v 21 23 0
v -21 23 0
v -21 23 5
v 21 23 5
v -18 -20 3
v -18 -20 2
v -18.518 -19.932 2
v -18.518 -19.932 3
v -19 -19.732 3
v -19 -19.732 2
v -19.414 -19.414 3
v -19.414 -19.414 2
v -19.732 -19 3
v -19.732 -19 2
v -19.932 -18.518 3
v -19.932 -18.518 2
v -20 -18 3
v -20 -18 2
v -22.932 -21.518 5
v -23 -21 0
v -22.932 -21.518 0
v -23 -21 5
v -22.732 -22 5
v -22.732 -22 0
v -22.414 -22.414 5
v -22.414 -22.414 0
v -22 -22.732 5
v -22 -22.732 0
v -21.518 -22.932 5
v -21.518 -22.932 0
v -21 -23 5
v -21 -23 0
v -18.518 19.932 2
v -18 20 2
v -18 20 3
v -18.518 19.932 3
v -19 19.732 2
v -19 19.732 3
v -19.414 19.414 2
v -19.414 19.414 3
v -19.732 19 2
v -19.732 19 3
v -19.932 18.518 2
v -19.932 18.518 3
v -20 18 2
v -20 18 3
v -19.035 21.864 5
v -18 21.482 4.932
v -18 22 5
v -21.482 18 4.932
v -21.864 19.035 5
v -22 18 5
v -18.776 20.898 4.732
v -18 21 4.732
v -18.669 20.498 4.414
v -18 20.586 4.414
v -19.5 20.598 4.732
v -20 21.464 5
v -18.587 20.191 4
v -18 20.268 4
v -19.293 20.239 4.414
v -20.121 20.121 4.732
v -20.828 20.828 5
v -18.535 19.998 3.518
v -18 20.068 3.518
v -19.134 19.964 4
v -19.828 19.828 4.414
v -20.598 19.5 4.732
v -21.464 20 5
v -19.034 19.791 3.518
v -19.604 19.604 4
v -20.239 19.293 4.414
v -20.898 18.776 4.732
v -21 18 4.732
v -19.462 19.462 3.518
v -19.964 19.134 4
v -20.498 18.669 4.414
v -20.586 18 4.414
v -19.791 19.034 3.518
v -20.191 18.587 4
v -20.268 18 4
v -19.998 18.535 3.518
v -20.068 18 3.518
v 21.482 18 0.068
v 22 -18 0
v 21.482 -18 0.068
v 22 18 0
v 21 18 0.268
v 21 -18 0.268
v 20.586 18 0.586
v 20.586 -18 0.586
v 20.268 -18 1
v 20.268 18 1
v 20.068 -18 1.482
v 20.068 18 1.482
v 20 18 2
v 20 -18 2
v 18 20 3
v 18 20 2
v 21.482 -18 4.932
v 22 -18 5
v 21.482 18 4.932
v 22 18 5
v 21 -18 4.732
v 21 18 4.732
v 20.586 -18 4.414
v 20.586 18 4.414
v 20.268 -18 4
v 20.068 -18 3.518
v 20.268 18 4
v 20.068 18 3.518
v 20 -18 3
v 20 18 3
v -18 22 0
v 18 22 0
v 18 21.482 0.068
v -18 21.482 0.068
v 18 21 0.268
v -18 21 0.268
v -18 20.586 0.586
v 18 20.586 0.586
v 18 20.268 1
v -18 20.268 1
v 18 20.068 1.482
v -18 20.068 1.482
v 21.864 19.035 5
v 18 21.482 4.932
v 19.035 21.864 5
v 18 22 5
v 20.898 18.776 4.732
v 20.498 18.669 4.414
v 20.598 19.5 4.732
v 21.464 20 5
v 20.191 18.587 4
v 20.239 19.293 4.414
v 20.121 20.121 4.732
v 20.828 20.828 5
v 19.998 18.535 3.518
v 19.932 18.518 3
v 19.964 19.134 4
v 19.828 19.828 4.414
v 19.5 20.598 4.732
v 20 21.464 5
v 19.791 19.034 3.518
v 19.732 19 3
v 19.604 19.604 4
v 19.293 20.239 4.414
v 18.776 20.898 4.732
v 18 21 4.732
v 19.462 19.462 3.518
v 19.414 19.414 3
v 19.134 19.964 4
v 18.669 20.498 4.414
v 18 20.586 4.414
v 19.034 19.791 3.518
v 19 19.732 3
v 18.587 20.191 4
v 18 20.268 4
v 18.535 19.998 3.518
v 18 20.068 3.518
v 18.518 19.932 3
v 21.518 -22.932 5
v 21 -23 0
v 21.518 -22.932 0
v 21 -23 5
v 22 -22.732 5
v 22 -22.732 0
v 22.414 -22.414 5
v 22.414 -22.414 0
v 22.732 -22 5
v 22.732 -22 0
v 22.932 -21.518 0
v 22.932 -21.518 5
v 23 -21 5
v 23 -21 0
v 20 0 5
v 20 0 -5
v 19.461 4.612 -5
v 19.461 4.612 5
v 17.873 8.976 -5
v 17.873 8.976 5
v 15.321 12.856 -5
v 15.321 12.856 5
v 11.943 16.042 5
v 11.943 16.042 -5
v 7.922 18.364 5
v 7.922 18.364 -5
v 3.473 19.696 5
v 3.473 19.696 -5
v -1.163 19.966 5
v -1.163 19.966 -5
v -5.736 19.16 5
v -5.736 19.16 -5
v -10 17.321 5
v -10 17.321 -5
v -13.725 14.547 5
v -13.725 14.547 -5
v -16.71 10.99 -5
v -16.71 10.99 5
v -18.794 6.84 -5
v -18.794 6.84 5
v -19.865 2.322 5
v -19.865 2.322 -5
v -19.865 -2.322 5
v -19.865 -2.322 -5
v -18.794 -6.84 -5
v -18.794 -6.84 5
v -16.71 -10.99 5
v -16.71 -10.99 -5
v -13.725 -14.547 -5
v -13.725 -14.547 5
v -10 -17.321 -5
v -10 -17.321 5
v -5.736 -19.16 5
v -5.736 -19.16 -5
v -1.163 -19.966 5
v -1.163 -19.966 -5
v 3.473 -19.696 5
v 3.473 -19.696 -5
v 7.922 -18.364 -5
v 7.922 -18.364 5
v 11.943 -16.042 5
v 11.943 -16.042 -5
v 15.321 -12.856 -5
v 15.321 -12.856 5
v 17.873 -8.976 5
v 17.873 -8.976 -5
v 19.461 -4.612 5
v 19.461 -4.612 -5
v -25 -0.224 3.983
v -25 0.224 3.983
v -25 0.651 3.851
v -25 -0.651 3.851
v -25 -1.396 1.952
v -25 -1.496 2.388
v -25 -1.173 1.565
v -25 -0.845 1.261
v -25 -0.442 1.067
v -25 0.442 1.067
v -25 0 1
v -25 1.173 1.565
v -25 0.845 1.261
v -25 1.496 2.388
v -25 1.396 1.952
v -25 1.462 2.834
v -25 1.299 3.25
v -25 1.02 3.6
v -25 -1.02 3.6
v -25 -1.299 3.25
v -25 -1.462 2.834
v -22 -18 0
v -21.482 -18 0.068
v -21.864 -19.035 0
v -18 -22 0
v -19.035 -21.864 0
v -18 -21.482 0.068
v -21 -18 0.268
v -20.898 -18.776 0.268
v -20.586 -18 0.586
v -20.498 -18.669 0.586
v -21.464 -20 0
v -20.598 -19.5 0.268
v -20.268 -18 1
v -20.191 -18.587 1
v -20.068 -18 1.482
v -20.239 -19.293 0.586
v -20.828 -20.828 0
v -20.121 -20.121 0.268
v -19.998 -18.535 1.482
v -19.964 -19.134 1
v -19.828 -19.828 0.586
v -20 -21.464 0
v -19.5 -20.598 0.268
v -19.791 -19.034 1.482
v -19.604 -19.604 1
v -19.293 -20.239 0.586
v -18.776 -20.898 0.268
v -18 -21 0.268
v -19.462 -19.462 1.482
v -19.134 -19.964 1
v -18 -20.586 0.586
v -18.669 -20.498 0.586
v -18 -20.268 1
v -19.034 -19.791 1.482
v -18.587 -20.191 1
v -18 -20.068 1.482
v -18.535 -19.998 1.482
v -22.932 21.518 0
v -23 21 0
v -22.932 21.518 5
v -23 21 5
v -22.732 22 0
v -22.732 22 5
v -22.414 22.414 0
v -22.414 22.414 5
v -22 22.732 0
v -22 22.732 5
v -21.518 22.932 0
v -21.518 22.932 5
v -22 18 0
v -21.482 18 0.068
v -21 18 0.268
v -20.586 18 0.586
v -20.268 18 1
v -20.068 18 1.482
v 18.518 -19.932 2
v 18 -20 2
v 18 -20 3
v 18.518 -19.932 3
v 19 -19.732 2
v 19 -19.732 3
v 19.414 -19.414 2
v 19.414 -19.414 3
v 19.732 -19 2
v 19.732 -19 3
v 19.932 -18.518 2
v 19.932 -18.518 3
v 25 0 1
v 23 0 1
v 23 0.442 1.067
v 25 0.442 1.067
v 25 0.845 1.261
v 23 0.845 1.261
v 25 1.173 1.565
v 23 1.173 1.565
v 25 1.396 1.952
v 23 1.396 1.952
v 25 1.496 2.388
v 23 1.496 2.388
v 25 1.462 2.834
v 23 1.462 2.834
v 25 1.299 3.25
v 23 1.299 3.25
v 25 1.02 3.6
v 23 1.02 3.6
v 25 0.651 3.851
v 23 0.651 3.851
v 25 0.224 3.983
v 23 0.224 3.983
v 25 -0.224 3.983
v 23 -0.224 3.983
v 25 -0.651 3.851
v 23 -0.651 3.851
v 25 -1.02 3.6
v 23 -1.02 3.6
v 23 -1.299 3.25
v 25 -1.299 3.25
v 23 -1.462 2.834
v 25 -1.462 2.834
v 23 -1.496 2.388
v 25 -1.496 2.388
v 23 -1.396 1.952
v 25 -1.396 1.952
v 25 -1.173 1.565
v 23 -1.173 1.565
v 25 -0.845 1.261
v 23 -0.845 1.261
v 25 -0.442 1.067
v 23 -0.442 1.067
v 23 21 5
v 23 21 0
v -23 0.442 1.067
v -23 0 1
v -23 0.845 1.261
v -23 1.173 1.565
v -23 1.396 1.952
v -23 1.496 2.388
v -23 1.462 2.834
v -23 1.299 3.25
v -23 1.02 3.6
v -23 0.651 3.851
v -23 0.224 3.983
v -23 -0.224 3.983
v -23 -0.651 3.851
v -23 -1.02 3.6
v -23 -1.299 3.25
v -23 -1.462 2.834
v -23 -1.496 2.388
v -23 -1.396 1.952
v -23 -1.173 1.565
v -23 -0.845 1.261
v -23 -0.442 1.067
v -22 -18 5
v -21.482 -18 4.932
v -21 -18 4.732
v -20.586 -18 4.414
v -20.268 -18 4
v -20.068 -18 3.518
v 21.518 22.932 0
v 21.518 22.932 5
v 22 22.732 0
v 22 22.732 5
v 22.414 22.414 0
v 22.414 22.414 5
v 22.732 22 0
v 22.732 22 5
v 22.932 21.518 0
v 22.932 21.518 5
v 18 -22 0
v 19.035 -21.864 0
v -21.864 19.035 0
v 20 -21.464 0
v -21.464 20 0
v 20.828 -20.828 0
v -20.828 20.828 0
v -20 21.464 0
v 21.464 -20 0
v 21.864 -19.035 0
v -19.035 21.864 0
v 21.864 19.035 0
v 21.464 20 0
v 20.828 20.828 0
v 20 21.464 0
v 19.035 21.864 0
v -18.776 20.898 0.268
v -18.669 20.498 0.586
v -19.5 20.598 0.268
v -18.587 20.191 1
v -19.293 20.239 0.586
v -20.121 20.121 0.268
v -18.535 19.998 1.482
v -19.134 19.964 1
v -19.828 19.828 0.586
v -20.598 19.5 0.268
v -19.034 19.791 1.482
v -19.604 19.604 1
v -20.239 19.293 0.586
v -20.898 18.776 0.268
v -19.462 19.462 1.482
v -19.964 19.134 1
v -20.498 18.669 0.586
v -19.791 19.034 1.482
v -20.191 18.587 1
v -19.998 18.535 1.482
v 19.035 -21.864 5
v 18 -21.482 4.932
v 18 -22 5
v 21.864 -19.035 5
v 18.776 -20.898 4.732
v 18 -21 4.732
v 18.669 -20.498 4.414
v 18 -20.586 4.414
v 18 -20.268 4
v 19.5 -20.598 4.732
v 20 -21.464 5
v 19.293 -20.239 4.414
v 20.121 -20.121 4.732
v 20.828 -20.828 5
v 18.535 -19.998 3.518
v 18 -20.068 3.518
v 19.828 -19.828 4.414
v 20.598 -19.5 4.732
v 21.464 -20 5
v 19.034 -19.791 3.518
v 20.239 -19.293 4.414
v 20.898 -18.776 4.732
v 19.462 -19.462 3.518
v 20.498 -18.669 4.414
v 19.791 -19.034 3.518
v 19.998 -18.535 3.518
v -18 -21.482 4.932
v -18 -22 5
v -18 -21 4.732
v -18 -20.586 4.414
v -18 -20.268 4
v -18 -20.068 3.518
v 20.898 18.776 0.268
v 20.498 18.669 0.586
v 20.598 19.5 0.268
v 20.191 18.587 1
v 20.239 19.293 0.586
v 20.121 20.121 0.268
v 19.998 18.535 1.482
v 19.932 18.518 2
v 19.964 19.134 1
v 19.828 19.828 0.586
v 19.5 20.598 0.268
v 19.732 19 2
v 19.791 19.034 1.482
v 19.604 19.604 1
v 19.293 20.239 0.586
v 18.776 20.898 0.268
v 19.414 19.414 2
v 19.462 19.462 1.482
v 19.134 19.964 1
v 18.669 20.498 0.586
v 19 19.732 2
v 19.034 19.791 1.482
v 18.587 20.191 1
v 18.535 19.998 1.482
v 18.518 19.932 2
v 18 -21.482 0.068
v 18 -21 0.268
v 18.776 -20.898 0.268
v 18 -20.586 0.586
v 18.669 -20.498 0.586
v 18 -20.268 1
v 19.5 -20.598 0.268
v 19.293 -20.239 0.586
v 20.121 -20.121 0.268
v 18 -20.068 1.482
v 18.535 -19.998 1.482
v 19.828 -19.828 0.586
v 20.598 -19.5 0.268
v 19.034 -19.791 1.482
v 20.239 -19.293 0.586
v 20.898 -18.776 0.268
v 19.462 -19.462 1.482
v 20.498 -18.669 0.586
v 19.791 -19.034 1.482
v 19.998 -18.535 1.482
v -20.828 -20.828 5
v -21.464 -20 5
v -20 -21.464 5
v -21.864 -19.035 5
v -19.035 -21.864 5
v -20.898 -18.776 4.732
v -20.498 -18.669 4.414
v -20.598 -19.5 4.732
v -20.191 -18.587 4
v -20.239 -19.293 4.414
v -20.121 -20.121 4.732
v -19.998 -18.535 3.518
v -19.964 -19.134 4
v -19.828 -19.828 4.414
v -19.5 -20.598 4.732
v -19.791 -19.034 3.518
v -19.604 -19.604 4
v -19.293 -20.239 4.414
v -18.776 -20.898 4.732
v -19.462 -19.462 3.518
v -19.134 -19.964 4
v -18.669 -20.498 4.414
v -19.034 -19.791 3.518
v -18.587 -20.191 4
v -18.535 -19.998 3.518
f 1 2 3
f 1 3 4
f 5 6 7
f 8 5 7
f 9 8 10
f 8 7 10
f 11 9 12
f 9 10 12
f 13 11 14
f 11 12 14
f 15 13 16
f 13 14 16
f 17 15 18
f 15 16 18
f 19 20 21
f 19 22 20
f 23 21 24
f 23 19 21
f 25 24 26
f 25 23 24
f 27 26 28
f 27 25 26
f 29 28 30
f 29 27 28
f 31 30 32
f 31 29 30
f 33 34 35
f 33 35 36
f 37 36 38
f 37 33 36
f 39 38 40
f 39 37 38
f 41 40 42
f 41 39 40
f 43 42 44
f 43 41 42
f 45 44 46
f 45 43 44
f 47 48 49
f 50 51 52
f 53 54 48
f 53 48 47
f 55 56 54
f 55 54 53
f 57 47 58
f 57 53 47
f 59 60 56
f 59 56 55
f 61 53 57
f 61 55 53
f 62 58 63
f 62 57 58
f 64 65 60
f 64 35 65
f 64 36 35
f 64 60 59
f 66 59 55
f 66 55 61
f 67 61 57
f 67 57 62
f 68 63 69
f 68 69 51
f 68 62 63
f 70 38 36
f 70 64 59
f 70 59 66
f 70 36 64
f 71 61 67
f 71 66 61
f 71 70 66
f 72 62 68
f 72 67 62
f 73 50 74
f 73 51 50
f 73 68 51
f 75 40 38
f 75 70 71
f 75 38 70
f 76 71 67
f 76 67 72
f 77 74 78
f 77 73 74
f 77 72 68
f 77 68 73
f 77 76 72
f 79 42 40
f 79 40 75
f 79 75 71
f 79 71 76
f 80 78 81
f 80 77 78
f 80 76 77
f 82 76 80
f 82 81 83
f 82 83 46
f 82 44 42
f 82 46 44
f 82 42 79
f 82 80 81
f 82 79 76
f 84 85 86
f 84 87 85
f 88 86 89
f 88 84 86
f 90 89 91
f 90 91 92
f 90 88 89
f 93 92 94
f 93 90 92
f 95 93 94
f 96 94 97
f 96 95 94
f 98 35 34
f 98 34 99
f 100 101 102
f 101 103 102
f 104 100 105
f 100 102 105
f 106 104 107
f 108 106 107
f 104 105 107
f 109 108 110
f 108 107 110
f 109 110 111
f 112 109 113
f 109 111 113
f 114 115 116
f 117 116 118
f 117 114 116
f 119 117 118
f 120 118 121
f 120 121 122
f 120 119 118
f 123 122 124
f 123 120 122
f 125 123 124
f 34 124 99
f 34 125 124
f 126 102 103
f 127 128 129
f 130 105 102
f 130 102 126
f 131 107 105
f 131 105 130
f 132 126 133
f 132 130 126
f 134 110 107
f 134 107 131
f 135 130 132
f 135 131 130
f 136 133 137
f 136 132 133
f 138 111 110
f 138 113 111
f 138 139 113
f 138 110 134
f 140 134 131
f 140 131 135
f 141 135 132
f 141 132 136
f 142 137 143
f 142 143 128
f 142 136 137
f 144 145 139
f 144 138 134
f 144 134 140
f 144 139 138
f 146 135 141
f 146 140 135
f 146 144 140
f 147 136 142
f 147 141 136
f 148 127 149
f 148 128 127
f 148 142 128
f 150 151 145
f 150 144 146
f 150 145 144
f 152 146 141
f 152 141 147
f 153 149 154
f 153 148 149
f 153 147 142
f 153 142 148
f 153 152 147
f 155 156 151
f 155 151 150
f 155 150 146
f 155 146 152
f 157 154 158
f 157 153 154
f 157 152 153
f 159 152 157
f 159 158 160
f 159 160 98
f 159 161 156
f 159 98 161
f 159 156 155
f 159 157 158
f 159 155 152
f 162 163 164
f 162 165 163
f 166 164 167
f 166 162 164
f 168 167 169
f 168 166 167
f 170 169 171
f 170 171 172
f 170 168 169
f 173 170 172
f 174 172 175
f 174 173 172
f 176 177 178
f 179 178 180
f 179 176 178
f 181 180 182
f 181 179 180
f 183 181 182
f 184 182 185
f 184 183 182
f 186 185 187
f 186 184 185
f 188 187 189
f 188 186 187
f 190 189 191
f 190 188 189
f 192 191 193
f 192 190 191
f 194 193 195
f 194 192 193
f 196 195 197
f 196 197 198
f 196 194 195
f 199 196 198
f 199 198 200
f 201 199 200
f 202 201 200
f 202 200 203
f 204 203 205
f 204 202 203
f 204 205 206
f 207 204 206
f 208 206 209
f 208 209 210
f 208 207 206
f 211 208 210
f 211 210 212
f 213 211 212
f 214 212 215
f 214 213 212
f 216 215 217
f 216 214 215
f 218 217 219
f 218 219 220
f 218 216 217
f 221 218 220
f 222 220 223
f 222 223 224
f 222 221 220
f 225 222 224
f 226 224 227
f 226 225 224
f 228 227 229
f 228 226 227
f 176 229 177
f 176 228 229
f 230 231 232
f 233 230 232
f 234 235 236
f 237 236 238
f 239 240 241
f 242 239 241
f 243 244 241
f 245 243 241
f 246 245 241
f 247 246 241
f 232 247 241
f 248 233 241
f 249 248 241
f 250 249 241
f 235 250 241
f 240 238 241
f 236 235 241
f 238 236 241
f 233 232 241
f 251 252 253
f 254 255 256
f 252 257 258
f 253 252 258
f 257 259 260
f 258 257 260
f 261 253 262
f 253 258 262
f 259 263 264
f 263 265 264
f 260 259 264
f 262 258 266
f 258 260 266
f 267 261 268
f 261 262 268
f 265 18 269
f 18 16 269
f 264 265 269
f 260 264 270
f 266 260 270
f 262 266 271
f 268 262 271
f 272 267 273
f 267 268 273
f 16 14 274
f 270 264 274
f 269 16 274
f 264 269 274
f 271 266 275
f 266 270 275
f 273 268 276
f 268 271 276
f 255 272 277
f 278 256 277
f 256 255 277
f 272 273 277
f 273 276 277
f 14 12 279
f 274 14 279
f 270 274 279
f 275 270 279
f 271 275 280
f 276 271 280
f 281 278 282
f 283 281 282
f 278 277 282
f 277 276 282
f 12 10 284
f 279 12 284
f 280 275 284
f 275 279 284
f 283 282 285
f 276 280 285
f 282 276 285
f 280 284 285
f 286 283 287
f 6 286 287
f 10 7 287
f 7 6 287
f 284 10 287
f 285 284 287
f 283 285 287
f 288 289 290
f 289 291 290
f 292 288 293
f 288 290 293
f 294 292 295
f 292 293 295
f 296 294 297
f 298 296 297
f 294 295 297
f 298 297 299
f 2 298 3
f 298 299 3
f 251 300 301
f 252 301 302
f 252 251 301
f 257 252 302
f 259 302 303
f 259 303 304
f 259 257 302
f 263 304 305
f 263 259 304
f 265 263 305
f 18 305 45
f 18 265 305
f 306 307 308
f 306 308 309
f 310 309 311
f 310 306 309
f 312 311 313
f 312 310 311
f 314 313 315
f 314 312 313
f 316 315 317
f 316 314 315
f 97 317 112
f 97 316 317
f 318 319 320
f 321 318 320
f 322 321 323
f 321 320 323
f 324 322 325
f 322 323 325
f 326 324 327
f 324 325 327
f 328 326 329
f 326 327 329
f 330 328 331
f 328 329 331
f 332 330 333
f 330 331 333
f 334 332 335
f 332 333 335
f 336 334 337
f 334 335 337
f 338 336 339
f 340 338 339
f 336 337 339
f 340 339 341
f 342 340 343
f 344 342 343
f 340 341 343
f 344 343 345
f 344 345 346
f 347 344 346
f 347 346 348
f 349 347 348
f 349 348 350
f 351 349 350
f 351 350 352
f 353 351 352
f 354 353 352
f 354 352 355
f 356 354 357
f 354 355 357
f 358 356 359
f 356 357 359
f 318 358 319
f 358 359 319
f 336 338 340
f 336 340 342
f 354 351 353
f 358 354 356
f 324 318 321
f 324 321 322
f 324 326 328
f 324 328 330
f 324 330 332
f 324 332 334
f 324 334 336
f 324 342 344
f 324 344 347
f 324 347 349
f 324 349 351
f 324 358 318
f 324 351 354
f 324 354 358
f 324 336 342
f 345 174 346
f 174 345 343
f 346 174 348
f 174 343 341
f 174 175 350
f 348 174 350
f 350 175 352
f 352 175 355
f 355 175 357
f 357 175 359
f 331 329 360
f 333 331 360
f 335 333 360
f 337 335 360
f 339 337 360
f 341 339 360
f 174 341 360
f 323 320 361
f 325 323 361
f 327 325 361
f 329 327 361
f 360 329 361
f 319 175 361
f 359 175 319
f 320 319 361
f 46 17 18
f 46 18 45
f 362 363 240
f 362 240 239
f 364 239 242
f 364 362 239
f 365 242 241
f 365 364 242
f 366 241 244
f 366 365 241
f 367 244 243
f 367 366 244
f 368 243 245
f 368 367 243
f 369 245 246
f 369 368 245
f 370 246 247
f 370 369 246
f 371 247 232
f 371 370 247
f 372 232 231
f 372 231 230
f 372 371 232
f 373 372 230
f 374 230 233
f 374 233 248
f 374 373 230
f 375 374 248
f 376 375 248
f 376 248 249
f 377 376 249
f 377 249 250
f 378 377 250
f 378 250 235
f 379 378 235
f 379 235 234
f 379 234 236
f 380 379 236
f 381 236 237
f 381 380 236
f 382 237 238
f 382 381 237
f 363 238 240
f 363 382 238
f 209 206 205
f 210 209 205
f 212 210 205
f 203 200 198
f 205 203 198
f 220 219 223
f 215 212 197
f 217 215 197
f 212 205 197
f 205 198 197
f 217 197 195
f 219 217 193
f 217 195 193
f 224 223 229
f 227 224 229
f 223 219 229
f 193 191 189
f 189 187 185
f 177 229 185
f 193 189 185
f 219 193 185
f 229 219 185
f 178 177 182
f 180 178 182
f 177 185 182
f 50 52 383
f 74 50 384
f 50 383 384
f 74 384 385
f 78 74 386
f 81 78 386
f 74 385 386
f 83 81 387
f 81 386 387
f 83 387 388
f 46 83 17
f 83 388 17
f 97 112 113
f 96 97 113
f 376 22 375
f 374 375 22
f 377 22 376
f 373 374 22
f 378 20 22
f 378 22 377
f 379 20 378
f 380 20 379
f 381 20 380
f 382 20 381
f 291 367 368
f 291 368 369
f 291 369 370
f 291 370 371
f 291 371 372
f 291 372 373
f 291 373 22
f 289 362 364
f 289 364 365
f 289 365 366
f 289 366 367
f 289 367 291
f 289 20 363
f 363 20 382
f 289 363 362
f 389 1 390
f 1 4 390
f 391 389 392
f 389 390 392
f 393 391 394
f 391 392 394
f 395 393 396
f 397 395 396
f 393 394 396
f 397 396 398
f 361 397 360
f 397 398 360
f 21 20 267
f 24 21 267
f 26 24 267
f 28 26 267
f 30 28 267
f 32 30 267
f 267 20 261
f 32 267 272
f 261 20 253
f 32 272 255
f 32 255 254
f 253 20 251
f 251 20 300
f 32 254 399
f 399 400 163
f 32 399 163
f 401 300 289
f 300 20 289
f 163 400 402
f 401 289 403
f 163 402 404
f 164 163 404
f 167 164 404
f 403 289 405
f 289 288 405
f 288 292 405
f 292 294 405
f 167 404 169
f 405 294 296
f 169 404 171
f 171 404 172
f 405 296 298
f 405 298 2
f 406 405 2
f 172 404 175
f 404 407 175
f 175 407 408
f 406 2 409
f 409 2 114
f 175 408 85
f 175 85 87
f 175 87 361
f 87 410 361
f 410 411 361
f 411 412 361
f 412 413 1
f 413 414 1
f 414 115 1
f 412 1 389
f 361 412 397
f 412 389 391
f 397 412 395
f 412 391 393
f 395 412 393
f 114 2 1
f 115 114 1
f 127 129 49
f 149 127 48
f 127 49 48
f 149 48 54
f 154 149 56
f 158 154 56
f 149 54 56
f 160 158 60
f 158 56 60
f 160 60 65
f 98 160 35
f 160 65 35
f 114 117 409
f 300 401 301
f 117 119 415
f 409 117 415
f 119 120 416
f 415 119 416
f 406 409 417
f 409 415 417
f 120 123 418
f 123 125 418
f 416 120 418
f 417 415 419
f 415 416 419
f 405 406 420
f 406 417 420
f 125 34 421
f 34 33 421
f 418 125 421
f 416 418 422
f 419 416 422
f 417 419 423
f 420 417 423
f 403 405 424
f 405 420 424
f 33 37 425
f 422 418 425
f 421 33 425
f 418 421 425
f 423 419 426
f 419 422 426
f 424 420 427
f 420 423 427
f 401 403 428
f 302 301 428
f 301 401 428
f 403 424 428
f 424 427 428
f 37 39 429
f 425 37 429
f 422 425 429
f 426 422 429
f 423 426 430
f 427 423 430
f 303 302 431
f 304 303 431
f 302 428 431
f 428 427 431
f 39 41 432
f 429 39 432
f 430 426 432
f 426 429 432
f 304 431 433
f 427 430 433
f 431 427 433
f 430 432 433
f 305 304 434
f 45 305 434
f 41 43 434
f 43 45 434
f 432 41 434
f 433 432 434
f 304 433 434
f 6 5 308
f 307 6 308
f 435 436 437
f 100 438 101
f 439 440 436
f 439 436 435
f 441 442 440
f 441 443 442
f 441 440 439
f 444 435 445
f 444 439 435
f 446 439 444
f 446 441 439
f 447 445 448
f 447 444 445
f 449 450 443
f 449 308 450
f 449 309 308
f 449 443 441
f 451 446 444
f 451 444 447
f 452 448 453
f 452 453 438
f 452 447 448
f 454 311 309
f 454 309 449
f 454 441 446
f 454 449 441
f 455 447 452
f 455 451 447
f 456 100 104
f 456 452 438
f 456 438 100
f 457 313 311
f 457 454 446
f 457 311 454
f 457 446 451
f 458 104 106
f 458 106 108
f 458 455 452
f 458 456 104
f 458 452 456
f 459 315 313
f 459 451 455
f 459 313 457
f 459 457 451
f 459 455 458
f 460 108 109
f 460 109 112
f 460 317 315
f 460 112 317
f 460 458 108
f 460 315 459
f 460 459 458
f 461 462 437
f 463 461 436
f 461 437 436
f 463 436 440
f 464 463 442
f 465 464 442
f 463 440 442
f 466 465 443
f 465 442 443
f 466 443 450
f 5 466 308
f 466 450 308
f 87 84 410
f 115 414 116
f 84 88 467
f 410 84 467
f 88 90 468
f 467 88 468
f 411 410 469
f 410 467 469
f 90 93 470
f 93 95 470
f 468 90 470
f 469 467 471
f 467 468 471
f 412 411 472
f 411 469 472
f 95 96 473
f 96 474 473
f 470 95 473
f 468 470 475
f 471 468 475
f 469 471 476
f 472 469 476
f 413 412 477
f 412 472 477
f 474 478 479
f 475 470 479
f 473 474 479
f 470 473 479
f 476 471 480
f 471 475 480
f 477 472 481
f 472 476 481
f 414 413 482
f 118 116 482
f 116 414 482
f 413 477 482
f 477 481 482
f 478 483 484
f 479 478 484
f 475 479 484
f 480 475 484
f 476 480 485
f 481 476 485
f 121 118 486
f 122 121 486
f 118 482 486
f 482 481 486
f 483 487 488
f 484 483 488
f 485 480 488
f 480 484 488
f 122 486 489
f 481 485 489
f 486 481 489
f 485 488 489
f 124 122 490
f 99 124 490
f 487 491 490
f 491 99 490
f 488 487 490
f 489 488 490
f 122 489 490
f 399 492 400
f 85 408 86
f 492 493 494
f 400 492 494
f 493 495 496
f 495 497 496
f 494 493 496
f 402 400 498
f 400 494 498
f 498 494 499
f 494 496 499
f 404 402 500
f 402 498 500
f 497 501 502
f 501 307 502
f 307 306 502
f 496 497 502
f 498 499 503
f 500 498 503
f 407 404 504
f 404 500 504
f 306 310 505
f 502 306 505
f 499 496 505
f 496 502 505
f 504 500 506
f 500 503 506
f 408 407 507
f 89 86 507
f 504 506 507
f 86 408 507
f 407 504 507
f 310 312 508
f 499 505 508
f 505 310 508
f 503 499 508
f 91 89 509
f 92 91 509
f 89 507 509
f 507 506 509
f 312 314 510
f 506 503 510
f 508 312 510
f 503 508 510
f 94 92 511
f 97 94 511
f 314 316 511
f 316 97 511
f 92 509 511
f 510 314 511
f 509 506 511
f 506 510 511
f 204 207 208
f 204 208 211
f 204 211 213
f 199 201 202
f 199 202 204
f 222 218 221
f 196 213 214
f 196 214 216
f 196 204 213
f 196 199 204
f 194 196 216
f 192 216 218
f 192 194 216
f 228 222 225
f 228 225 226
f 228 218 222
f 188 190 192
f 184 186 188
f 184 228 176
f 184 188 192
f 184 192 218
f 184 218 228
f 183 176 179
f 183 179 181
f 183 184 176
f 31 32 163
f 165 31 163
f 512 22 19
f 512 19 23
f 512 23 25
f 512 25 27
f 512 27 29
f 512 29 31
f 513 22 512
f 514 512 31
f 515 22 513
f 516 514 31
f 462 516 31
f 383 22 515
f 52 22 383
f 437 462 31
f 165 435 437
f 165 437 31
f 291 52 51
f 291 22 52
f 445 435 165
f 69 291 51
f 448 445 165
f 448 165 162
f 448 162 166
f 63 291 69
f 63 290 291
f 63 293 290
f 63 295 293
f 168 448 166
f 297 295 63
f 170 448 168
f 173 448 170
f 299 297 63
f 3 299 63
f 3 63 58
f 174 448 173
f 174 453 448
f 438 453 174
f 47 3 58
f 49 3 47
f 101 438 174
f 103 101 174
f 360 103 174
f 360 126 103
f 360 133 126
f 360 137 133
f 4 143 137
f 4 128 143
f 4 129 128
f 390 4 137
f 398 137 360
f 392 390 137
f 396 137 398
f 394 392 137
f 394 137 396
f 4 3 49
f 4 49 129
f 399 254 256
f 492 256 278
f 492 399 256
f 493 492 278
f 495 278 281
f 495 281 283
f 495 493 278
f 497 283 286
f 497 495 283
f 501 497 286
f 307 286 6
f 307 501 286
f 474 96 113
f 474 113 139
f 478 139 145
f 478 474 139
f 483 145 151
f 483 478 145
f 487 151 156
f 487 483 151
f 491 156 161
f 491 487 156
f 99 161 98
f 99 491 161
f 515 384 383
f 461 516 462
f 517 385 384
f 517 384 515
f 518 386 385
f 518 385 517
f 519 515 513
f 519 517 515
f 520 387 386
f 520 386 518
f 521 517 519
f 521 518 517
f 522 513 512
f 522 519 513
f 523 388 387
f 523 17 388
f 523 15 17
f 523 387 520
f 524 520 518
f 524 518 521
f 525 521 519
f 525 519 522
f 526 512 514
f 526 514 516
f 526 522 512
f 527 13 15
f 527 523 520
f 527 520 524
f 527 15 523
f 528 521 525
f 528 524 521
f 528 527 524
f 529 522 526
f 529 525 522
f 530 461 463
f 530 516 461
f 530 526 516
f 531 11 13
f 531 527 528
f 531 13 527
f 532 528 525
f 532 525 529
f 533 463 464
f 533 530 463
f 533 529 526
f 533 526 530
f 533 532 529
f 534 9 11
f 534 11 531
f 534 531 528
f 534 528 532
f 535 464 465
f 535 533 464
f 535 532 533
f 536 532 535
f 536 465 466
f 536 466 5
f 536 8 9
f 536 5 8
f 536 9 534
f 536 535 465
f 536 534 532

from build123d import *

# Parameters (mm, degrees)
SKETCH1_W           = 46
SKETCH1_H           = 46
BOSS_EXTRUDE2_DEPTH = 5
SKETCH3_W           = 40
SKETCH3_H           = 40
CUT_EXTRUDE1_DEPTH  = 15
FILLET1_R           = 2
FILLET2_R           = 2
FILLET3_R           = 2
BOSS_EXTRUDE3_DEPTH = 2
SKETCH5_R           = 20
BOSS_EXTRUDE4_DEPTH = 10


with BuildPart() as part:
    # Sketch1 → Boss-Extrude2 (new body)
    with BuildSketch(Plane.XY):
        Rectangle(SKETCH1_W, SKETCH1_H)
    extrude(amount=BOSS_EXTRUDE2_DEPTH)

    # Sketch3 → Cut-Extrude1 (cut)
    with BuildSketch(Plane.XY.offset(5)):
        Rectangle(SKETCH3_W, SKETCH3_H)
    extrude(amount=-CUT_EXTRUDE1_DEPTH, mode=Mode.SUBTRACT)

    # Fillet1
    fillet1_edges = [part.edges().sort_by_distance(p)[0] for p in [
        (20, 20, 2.5),
        (20, -20, 2.5),
        (-20, -20, 2.5),
        (-20, 20, 2.5),
    ]]
    fillet(fillet1_edges, radius=FILLET1_R)

    # Fillet2
    fillet2_edges = [part.edges().sort_by_distance(p)[0] for p in [
        (20, 0, 0),
        (0, -20, 0),
        (-20, 0, 0),
        (0, 20, 0),
        (19.414213562, -19.414213562, 0),
        (-19.414213562, -19.414213562, 0),
        (-19.414213562, 19.414213562, 0),
        (19.414213562, 19.414213562, 0),
        (23, -23, 2.5),
        (-23, -23, 2.5),
        (-23, 23, 2.5),
        (23, 23, 2.5),
    ]]
    fillet(fillet2_edges, radius=FILLET2_R)

    # Fillet3
    fillet3_edges = [part.edges().sort_by_distance(p)[0] for p in [
        (20, 0, 5),
        (0, -20, 5),
        (-20, 0, 5),
        (0, 20, 5),
        (19.414213562, -19.414213562, 5),
        (-19.414213562, -19.414213562, 5),
        (-19.414213562, 19.414213562, 5),
        (19.414213562, 19.414213562, 5),
    ]]
    fillet(fillet3_edges, radius=FILLET3_R)

    # Sketch4 → Boss-Extrude3 (add)
    with BuildSketch(Plane(origin=(23, 0, 0), x_dir=(0, 0, -1), z_dir=(1, 0, 0))):
        with BuildLine():
            ThreePointArc((-4, 0), (-2.5, -1.5), (-1, 0))
            Line((-1, 0), (-4, 0))
        make_face()
        with BuildLine():
            Line((-4, 0), (-1, 0))
            ThreePointArc((-1, 0), (-2.5, 1.5), (-4, 0))
        make_face()
    boss_extrude3 = extrude(amount=BOSS_EXTRUDE3_DEPTH)

    # Mirror1: Boss-Extrude3 across plane
    add(boss_extrude3.mirror(Plane(origin=(0, 0, 0), x_dir=(0, 0, 1), z_dir=(1, 0, 0))))


with BuildPart() as body_2:
    # Sketch5 → Boss-Extrude4 (new body)
    with BuildSketch(Plane.XY.offset(5)):
        Circle(SKETCH5_R)
    extrude(amount=-BOSS_EXTRUDE4_DEPTH)


solid = Compound([part.part, body_2.part])
